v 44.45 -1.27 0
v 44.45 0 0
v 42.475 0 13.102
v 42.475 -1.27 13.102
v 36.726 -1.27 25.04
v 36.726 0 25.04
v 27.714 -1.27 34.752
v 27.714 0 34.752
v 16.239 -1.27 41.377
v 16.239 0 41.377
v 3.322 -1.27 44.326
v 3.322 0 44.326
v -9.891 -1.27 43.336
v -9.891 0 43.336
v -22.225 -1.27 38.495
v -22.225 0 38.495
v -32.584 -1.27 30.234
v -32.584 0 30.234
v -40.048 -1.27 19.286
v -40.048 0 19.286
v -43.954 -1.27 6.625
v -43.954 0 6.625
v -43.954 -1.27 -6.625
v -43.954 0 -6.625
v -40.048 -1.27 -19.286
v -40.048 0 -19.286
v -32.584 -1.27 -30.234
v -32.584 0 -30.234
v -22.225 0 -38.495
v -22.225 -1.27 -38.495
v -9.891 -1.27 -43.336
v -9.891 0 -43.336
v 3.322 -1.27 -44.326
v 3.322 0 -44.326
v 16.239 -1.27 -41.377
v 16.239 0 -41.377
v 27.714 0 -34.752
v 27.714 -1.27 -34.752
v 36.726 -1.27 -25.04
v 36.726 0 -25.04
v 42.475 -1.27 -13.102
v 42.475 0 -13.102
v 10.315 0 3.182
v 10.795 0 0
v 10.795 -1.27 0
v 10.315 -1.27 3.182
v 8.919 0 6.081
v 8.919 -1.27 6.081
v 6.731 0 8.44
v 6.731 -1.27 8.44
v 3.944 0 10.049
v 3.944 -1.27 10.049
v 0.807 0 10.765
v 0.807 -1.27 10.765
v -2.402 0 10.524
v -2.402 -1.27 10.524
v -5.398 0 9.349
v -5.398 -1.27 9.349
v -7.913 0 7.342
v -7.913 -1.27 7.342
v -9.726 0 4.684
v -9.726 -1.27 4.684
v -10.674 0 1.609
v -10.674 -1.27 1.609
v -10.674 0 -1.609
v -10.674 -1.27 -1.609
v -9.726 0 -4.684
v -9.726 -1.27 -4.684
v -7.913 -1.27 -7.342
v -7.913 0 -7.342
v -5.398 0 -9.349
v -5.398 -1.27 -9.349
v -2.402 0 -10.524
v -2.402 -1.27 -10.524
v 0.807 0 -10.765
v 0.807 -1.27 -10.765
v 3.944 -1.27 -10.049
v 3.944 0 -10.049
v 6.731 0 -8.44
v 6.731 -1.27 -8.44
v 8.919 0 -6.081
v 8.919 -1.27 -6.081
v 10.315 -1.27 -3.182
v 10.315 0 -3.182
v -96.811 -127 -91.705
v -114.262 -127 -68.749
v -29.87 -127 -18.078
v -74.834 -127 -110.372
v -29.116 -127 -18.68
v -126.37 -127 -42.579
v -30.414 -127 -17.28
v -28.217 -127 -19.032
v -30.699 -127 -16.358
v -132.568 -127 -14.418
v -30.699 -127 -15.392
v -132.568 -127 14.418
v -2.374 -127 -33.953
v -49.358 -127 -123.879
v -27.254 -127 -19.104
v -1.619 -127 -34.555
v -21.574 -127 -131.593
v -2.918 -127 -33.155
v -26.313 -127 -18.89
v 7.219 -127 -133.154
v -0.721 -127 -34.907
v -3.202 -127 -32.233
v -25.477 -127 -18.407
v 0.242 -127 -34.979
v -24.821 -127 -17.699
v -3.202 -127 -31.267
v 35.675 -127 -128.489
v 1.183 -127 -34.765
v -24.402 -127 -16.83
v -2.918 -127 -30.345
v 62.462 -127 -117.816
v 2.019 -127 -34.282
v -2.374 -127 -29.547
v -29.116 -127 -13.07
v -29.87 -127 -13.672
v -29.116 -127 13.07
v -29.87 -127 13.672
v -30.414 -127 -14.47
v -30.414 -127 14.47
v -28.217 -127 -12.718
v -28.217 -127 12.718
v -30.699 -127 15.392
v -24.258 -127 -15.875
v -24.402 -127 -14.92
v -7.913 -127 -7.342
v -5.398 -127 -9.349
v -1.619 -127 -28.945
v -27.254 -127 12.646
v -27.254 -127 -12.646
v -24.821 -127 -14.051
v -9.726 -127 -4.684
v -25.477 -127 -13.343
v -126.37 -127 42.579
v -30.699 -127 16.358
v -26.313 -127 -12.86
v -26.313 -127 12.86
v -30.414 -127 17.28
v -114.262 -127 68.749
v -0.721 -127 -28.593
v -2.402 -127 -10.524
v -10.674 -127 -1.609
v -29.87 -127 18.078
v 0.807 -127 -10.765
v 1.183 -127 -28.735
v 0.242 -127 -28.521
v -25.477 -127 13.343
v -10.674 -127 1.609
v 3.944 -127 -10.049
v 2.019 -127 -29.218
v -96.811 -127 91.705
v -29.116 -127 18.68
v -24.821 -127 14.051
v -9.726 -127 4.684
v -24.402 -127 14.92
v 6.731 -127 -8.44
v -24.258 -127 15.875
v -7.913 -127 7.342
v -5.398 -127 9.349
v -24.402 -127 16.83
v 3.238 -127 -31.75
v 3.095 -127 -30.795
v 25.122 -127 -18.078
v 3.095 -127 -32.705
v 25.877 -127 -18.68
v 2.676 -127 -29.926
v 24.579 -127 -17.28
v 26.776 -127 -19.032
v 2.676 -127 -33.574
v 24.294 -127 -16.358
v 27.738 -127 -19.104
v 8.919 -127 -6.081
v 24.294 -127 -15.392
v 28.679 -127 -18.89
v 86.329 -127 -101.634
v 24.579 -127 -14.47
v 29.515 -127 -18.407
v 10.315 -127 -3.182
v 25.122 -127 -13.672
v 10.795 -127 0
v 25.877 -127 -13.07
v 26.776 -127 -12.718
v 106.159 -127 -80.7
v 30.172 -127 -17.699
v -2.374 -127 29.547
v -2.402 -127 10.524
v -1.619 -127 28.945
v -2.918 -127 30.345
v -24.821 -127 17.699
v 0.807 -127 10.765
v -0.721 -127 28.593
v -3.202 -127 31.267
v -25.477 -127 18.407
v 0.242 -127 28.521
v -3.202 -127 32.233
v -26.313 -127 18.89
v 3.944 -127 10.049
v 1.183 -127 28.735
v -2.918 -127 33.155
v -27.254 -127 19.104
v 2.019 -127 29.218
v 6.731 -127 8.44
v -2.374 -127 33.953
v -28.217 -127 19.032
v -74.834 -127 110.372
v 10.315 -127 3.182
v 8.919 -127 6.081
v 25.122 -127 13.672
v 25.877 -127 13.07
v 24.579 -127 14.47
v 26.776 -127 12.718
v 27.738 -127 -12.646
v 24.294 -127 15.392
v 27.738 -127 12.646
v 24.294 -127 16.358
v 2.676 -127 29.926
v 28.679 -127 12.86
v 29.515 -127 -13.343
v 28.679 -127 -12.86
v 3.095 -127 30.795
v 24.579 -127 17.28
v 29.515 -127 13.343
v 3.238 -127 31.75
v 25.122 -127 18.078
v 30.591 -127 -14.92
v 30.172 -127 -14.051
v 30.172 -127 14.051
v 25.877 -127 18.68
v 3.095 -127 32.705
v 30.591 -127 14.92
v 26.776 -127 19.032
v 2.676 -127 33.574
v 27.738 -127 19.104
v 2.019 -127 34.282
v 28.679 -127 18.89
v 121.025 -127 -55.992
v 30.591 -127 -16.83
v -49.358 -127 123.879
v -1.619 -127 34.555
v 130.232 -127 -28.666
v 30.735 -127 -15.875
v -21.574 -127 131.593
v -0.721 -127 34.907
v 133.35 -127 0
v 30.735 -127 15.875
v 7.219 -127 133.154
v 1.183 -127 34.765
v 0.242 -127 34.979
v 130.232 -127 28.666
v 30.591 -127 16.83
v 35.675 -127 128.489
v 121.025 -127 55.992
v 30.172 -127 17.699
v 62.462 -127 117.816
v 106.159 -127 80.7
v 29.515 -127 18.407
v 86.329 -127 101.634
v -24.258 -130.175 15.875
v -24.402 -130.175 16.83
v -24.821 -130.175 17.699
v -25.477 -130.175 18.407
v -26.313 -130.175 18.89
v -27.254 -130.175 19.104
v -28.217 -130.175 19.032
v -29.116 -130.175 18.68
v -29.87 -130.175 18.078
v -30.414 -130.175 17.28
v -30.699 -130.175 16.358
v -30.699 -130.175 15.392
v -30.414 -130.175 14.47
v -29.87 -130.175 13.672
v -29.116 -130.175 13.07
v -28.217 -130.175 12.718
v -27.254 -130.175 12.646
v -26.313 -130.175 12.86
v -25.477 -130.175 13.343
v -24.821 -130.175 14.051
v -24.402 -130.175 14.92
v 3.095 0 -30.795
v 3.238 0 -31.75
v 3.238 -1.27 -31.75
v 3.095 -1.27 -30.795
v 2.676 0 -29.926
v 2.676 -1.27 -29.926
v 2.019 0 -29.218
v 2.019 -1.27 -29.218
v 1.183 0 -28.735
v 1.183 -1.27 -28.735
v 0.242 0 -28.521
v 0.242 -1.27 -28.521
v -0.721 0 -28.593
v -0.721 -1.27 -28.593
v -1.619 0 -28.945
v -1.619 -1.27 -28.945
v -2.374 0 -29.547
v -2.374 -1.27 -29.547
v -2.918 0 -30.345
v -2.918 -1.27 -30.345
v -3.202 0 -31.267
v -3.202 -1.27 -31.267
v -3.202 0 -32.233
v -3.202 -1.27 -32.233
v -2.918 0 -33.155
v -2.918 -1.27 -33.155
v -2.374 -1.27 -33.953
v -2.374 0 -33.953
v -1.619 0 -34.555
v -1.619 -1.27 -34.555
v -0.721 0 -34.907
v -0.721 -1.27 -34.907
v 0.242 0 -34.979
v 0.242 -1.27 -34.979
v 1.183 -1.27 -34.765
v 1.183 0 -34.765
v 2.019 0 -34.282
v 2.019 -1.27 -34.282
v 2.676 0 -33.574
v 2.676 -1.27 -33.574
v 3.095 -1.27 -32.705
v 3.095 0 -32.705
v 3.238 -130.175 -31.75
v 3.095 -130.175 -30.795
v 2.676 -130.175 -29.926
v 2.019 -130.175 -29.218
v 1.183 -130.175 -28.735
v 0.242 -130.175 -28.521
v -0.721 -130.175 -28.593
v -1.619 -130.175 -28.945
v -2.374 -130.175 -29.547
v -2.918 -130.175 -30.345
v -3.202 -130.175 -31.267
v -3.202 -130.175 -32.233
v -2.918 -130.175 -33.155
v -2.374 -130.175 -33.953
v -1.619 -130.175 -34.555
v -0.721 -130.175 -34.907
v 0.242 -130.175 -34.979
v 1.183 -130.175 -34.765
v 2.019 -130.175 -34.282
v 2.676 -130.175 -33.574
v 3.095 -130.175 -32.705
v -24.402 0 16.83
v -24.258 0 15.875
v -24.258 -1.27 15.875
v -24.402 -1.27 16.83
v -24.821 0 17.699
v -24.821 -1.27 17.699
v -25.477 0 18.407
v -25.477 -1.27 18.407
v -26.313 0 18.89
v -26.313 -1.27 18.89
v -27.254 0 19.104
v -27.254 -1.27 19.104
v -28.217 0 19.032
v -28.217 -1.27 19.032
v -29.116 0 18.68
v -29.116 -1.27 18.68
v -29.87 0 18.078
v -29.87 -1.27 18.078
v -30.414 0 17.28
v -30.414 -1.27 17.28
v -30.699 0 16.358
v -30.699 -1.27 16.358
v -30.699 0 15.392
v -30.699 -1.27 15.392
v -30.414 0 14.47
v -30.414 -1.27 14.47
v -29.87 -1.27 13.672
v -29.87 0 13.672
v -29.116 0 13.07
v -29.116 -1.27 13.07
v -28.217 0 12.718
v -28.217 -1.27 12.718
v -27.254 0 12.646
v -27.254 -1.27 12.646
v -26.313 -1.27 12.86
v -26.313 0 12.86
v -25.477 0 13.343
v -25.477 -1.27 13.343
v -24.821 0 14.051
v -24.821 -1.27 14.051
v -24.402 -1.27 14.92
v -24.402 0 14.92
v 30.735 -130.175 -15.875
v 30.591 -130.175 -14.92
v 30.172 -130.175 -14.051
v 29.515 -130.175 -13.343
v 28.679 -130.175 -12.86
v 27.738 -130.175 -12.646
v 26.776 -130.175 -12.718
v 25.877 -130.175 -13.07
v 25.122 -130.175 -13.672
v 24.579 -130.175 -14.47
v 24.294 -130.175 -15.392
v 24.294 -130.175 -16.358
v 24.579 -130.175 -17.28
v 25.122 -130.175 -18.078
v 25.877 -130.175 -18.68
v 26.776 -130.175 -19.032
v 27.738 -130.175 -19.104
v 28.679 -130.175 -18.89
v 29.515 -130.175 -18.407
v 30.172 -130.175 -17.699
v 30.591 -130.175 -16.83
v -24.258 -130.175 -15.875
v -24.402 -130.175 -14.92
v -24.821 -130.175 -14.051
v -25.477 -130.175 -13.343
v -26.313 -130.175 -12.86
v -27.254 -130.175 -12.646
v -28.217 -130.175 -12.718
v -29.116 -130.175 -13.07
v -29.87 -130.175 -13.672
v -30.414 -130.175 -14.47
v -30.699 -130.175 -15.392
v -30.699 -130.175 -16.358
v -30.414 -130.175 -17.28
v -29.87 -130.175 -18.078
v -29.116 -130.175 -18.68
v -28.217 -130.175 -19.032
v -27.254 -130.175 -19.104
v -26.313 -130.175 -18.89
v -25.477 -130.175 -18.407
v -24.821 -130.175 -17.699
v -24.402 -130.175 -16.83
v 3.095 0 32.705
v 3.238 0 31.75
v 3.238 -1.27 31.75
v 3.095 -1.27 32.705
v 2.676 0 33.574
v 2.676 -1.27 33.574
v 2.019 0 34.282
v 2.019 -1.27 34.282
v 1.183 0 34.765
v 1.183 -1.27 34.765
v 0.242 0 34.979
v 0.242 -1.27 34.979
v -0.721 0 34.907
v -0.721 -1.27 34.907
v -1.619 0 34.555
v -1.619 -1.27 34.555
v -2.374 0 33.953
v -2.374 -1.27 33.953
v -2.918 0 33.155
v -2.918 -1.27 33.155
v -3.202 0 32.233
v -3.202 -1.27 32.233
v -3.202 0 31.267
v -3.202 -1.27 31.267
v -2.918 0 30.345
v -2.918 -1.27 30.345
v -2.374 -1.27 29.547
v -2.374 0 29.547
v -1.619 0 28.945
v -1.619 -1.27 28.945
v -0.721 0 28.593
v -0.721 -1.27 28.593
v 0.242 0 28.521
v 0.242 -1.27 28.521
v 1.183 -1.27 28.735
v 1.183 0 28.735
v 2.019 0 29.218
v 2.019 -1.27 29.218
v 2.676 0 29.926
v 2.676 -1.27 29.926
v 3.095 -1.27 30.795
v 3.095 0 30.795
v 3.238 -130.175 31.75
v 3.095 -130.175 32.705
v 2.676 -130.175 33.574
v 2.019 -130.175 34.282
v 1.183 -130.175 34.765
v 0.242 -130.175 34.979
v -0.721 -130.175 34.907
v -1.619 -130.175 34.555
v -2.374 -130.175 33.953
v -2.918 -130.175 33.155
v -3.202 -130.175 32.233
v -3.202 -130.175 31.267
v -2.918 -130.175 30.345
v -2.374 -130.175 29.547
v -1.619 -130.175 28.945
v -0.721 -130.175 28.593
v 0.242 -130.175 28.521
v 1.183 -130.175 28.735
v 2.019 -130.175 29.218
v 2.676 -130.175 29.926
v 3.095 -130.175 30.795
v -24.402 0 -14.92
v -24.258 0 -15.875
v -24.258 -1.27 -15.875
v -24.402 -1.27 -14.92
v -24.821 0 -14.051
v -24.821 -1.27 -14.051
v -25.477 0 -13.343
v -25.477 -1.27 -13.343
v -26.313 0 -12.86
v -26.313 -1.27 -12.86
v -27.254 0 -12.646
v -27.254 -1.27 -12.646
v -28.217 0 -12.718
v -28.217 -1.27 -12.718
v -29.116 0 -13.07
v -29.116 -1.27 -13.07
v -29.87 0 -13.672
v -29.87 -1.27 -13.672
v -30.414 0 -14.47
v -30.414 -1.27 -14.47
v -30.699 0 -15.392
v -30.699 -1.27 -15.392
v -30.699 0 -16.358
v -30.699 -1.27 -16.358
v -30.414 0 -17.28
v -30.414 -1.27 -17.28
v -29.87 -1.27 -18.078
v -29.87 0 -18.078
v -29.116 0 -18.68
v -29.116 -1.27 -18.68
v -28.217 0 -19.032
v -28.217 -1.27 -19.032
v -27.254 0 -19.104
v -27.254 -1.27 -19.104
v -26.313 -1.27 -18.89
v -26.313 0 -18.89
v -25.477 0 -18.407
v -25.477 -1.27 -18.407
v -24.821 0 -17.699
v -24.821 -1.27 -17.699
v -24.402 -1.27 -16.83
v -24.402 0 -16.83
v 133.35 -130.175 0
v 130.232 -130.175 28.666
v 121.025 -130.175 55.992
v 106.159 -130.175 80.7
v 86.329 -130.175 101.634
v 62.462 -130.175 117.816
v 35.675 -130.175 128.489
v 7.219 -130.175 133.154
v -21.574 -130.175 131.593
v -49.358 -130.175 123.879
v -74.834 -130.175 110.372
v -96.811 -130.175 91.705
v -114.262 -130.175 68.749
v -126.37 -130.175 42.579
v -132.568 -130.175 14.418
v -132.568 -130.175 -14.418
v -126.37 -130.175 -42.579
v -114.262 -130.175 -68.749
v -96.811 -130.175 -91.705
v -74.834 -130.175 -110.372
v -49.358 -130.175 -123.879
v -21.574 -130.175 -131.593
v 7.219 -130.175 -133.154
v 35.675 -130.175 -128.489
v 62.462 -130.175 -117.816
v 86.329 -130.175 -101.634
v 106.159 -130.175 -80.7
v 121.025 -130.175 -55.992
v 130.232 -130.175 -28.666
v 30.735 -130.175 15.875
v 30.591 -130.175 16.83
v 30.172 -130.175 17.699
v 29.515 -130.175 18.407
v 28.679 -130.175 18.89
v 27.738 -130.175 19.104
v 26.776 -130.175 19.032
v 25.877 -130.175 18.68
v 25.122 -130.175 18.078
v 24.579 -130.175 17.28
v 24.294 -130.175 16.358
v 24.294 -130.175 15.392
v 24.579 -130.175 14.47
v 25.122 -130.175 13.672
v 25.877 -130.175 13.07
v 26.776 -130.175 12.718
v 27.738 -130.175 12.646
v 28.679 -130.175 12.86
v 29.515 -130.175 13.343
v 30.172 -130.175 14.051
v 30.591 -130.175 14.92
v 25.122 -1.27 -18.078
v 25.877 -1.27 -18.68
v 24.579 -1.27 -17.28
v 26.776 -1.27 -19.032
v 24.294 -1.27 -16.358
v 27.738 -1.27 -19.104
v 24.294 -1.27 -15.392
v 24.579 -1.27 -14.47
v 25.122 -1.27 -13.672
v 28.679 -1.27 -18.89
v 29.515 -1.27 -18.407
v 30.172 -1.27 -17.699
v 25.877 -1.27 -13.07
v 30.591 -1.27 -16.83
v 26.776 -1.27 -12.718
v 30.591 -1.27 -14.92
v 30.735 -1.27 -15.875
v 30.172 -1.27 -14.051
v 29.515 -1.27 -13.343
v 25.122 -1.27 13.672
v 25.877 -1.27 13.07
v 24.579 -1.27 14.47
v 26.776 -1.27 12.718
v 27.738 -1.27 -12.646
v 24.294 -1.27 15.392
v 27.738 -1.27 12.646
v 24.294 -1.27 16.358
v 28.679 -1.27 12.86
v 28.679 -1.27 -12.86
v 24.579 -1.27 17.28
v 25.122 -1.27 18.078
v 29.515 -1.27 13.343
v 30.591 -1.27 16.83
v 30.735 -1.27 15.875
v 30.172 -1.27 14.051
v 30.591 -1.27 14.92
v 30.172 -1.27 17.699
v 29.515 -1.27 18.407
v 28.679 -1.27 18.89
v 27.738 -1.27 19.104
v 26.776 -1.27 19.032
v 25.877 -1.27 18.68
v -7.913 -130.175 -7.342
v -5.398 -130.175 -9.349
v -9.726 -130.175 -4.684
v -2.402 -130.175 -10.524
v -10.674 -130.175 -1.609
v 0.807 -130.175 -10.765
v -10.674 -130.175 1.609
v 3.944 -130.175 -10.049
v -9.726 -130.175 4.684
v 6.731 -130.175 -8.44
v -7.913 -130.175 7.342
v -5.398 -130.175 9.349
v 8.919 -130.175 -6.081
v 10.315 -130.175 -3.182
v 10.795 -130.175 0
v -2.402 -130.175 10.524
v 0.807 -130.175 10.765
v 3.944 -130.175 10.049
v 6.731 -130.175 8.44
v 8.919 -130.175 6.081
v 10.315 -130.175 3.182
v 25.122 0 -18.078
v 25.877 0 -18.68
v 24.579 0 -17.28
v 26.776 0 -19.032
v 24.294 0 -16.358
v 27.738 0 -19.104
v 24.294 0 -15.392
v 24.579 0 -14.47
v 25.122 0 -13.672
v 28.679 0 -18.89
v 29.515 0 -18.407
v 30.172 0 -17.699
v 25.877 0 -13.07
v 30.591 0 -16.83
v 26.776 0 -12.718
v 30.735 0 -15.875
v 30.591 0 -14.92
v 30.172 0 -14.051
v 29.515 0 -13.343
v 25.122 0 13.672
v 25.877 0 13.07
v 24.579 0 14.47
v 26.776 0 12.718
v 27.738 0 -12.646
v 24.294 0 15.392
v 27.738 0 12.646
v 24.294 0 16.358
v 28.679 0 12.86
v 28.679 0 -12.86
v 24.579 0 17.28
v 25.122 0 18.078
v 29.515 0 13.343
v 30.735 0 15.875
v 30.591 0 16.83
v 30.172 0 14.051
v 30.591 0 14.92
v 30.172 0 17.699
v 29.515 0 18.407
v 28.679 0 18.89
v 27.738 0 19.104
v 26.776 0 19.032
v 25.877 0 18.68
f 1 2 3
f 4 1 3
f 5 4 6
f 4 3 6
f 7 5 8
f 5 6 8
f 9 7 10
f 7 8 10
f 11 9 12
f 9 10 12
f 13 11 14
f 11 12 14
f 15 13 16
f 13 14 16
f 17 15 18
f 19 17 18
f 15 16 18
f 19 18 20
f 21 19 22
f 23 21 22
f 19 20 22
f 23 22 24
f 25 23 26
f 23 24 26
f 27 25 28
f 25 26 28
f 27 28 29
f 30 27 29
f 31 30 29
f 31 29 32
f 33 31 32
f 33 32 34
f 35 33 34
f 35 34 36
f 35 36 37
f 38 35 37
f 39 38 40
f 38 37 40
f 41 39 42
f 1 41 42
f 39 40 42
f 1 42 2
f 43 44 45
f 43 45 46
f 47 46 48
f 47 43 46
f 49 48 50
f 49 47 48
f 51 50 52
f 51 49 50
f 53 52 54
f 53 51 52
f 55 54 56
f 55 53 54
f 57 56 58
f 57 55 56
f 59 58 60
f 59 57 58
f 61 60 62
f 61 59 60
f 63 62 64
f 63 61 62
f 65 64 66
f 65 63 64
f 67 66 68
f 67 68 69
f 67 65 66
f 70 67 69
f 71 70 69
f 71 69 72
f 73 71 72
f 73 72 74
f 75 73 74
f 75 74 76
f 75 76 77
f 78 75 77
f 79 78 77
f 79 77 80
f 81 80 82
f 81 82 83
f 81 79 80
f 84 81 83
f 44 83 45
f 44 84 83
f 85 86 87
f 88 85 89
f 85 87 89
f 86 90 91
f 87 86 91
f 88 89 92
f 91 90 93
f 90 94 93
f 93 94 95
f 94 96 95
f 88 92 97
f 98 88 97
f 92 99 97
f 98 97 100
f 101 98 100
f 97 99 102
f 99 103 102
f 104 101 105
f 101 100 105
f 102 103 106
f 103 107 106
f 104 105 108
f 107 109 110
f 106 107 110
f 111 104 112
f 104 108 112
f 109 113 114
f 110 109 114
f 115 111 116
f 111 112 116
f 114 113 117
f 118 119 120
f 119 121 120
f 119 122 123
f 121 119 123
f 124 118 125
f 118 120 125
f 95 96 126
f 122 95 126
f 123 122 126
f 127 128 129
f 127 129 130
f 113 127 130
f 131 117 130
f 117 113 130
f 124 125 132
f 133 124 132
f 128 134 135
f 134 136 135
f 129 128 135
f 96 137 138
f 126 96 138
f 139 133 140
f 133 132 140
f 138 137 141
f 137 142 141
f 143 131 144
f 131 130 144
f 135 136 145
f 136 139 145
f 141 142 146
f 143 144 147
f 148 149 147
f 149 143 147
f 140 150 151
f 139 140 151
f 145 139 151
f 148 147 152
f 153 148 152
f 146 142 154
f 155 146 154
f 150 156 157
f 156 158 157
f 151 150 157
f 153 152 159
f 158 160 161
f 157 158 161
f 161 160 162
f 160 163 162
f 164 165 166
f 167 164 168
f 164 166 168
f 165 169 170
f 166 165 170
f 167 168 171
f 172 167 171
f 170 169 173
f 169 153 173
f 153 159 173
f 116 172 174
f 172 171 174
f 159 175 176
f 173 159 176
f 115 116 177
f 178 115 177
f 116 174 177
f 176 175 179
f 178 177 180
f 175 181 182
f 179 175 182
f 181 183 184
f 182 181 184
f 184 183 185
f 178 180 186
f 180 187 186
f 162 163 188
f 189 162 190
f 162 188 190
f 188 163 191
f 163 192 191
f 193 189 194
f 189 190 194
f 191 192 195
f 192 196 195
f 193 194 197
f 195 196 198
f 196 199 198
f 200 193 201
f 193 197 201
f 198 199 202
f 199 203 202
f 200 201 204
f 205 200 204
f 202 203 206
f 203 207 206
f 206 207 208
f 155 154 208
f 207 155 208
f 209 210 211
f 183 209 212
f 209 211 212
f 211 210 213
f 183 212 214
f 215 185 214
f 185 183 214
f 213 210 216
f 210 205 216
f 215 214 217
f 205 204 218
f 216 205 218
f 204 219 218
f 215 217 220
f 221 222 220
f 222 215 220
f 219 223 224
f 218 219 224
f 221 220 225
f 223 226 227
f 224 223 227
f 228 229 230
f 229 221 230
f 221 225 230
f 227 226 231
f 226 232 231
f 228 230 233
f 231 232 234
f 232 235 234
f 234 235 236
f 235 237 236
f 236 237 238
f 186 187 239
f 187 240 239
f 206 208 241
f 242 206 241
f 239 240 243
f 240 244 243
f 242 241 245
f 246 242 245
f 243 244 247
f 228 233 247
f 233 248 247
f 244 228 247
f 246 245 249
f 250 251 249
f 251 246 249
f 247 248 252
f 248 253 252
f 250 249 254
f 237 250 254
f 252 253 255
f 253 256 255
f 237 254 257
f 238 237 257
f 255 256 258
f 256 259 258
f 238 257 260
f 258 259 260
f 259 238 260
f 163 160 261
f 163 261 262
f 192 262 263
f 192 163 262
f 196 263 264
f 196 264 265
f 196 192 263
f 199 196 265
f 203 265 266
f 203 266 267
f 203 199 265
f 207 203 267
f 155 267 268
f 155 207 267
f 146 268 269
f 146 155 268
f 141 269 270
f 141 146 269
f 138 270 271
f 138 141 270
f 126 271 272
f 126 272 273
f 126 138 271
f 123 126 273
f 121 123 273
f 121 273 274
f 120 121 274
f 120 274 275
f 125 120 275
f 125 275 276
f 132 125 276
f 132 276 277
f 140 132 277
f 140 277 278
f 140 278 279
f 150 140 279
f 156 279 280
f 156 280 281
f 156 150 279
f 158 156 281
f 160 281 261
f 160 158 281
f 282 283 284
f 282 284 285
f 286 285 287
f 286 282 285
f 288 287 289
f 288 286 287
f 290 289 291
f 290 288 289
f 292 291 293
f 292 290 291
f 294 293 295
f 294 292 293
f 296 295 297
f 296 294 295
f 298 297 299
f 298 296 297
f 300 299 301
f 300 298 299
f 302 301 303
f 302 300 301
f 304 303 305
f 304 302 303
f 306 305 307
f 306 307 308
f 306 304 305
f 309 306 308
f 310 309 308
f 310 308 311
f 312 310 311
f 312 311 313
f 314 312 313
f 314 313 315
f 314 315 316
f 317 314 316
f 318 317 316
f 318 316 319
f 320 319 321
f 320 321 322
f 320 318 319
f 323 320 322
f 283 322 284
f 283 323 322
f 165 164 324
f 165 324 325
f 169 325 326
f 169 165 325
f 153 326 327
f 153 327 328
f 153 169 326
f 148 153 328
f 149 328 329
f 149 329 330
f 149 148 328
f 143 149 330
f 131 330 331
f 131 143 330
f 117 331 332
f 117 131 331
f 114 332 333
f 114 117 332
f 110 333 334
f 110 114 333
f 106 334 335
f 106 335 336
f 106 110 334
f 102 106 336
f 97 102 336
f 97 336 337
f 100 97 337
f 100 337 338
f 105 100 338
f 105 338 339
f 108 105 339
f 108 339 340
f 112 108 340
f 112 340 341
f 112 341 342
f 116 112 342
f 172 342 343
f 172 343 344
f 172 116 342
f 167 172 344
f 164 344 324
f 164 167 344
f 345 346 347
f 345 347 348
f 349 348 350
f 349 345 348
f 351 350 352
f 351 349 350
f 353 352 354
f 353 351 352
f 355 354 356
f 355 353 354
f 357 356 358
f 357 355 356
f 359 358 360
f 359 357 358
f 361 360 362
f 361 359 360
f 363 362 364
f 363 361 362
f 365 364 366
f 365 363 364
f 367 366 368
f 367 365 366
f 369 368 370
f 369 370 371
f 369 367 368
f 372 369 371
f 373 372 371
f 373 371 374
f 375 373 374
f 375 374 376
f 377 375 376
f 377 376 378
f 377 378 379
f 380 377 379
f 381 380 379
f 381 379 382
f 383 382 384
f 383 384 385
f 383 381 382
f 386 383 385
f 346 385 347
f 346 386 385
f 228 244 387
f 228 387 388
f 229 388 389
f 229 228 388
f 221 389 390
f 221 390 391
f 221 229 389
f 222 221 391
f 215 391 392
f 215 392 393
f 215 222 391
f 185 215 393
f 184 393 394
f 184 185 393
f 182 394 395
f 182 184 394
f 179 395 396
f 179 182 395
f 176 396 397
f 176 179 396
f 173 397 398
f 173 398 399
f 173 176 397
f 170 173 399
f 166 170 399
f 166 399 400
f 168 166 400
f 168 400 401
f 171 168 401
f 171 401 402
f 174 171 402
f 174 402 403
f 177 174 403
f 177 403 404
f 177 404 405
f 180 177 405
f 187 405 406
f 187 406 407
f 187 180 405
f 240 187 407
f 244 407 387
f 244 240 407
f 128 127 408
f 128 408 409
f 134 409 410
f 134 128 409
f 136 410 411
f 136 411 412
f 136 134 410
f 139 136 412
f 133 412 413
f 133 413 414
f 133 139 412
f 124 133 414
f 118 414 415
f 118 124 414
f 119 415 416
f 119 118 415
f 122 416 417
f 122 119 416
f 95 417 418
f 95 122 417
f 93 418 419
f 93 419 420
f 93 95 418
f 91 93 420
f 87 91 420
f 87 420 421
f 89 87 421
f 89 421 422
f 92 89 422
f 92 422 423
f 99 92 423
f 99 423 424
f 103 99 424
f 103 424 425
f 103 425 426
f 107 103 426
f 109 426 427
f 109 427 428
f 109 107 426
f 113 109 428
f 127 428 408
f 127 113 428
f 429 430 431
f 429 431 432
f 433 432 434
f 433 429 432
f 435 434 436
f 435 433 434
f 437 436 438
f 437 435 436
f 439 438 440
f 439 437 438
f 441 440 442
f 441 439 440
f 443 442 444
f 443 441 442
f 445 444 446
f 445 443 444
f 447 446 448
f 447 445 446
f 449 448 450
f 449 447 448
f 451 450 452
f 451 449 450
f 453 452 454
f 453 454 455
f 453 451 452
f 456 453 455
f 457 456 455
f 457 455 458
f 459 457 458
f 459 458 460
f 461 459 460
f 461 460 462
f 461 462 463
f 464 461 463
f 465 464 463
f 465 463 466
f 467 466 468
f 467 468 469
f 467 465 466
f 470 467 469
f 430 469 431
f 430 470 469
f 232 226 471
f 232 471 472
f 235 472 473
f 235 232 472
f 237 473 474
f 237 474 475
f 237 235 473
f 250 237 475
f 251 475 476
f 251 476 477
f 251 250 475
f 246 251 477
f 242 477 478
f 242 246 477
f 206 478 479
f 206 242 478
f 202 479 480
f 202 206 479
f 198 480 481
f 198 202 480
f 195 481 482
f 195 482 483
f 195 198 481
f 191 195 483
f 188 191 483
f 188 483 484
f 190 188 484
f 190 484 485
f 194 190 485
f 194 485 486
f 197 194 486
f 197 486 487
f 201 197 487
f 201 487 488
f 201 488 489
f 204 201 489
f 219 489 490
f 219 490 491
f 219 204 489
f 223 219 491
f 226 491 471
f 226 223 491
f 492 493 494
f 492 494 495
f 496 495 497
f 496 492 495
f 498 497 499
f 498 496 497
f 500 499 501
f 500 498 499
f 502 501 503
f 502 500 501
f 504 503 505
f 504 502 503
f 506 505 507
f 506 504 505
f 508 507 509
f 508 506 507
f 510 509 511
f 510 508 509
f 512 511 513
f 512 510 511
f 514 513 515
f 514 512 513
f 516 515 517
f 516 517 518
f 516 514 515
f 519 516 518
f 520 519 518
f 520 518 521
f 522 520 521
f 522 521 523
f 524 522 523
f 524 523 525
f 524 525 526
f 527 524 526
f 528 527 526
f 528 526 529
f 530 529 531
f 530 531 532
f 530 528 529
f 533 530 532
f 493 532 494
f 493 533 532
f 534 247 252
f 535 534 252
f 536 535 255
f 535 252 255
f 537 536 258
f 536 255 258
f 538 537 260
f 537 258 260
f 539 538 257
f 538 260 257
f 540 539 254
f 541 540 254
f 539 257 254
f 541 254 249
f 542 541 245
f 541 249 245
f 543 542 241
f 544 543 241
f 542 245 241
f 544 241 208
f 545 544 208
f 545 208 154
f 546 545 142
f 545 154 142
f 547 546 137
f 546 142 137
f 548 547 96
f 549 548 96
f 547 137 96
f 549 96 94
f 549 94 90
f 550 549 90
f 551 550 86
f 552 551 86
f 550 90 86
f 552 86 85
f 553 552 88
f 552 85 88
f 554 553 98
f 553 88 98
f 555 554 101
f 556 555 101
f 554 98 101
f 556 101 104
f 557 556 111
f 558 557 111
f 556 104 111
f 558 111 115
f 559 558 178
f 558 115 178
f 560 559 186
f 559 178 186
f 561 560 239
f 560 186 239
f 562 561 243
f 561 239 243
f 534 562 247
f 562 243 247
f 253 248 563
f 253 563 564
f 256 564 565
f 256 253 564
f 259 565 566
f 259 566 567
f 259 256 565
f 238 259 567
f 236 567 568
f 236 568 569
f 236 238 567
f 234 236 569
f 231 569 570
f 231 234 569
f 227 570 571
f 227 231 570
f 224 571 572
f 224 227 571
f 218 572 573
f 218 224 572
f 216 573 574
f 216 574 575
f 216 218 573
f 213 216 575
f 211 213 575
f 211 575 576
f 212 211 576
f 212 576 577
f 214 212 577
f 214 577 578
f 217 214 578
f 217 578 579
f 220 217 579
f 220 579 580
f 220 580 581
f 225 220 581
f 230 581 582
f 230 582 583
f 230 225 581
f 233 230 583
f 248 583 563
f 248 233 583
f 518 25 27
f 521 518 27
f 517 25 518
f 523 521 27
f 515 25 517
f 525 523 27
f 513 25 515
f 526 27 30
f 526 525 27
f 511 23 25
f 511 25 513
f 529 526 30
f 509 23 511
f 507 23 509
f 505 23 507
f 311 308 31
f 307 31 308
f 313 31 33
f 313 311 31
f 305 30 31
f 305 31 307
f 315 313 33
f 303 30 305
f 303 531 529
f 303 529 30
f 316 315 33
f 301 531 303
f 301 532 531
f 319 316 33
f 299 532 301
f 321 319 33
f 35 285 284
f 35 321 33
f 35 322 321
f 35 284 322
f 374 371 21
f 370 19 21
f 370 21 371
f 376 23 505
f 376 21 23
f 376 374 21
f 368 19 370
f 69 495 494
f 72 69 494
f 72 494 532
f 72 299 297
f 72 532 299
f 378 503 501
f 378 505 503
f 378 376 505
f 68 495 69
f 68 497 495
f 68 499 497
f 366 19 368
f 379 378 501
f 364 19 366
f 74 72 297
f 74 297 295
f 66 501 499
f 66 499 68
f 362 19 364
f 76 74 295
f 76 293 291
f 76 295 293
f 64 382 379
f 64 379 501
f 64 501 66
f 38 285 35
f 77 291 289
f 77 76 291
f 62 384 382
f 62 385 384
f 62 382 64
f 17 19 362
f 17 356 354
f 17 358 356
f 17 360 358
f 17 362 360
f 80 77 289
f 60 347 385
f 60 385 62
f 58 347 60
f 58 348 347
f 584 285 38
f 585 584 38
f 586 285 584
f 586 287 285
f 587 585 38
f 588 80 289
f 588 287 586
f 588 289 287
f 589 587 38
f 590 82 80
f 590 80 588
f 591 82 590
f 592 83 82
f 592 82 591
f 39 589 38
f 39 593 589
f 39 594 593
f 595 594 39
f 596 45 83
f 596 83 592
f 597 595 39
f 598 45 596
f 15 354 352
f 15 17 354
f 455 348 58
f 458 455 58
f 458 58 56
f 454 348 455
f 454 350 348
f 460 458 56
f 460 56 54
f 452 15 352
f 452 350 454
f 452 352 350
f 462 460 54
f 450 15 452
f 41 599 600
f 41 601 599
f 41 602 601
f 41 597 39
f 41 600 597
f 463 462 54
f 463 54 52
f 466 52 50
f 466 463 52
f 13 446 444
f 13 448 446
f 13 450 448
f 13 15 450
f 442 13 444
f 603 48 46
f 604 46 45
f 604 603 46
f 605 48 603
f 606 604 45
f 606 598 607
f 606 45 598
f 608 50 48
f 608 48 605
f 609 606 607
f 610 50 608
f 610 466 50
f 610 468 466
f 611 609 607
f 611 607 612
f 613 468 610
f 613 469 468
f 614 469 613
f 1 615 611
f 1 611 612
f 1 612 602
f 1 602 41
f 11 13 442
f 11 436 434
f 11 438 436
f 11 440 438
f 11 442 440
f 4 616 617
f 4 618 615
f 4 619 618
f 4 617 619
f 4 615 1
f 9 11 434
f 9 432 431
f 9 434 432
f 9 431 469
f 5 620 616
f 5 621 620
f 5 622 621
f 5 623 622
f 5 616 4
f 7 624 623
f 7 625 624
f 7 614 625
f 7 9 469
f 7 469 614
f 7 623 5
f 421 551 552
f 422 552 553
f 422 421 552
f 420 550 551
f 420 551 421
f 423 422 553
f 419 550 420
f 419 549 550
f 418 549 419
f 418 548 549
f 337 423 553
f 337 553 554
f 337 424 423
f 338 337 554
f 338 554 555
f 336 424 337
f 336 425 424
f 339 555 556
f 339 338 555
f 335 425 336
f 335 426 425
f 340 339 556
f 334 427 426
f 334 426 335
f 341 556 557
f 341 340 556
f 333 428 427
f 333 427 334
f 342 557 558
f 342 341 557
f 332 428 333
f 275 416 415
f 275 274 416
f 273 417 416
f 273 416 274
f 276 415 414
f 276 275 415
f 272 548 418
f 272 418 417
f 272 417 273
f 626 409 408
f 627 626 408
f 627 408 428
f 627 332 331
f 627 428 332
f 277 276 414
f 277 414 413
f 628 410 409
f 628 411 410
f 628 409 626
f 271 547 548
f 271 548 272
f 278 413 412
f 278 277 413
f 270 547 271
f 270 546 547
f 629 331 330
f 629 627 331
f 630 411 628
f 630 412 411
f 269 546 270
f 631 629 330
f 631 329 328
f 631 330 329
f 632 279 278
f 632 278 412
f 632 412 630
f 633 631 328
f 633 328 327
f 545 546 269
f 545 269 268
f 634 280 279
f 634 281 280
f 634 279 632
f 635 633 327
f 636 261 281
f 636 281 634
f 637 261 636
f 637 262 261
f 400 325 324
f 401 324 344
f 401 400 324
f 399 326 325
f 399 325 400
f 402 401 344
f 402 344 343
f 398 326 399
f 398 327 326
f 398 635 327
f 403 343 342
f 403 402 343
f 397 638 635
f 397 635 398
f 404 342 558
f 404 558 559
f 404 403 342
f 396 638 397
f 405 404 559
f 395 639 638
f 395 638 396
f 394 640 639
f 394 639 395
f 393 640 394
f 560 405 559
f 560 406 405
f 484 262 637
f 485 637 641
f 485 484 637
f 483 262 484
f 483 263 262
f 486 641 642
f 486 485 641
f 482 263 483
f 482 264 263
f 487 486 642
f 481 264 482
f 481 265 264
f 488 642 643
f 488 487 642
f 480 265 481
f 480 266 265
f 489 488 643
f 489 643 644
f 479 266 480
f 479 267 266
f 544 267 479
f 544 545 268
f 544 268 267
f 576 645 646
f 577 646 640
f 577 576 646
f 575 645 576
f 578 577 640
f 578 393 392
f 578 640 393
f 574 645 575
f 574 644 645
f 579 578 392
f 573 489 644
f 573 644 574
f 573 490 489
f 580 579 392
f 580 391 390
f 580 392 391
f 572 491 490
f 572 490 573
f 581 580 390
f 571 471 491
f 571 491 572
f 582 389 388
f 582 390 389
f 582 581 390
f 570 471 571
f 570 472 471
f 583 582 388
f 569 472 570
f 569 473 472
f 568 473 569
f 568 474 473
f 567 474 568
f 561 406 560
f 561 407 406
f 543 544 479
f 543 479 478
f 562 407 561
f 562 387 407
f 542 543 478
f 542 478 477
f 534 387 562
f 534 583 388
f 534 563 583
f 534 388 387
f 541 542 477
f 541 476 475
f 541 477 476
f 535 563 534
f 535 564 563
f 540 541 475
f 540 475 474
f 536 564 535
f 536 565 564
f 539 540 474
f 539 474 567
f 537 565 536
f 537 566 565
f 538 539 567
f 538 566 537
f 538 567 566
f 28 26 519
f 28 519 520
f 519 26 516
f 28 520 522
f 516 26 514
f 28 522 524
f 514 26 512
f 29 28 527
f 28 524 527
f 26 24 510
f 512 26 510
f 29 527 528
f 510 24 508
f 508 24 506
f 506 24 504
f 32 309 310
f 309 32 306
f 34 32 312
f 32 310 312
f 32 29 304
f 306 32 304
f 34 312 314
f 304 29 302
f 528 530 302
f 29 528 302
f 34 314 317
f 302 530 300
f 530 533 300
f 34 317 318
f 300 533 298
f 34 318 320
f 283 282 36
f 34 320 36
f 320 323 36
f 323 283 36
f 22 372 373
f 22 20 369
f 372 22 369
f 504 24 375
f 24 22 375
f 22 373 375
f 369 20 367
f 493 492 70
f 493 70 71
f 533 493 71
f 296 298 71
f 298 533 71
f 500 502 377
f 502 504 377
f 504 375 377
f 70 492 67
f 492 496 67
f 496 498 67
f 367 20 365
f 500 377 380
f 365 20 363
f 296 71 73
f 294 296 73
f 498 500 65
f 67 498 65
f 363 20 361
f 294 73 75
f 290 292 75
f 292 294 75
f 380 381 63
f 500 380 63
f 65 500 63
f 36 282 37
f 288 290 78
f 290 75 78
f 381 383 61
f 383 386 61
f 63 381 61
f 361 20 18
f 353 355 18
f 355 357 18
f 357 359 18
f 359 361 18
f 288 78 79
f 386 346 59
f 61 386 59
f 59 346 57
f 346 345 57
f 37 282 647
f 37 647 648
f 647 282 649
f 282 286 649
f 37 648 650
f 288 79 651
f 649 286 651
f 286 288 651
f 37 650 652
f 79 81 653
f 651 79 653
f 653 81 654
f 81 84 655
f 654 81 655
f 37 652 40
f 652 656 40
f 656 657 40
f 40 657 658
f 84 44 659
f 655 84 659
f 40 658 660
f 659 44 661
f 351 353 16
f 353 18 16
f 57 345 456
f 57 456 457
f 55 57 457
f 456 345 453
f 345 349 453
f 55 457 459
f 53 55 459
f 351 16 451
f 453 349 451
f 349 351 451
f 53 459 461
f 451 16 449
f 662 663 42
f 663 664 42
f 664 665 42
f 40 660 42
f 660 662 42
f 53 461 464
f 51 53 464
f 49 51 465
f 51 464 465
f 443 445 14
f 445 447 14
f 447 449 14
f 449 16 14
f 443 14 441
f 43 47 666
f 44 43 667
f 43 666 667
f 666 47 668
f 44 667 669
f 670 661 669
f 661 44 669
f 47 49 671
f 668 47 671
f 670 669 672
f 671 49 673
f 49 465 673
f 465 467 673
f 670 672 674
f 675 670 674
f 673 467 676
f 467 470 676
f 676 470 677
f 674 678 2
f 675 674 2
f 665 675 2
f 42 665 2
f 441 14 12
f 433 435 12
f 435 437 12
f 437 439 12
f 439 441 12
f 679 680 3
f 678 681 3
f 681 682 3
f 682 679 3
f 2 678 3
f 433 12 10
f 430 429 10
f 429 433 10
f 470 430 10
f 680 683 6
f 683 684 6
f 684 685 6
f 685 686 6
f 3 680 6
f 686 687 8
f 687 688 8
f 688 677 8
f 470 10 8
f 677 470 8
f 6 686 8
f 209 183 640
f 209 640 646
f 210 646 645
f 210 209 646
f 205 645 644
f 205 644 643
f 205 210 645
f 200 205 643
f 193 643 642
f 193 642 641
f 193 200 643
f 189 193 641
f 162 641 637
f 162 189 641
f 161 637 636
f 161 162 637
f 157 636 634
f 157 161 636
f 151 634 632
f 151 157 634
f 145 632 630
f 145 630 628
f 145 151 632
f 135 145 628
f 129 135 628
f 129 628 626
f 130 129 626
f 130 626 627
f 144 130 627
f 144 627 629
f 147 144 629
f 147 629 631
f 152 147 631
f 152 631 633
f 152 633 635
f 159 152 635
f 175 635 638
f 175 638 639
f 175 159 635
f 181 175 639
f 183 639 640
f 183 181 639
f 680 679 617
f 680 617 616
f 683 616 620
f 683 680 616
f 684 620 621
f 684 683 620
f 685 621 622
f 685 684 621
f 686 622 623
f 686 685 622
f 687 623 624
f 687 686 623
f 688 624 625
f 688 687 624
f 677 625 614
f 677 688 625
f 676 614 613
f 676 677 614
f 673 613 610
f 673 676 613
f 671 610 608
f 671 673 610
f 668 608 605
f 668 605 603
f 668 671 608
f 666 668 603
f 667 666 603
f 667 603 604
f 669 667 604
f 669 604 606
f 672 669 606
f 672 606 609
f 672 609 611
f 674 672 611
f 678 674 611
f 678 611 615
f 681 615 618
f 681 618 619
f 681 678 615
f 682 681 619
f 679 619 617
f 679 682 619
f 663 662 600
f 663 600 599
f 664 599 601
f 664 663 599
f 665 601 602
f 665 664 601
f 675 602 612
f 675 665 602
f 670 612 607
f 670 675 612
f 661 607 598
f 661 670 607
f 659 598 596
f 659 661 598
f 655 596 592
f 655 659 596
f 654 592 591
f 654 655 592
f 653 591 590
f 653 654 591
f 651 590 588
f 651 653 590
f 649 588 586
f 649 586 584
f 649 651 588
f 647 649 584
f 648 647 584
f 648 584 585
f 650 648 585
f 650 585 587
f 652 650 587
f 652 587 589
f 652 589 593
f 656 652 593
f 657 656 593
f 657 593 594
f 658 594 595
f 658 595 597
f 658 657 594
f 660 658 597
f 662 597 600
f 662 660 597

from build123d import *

# Parameters (mm, degrees)
F0_R     = 44.45
F0_R_2   = 3.2385
F0_R_3   = 10.795
F1_DEPTH = 1.27
F3_R     = 133.35
F3_R_2   = 3.2385
F3_R_3   = 10.795
F4_DEPTH = 3.175


with BuildPart() as f1:
    # F0 (on Front) → F1 (new body)
    with BuildSketch(Plane.XZ):
        Circle(F0_R)
        with Locations((-27.496307, -15.875)):
            Circle(F0_R_2, mode=Mode.SUBTRACT)
        with Locations((0, -31.75)):
            Circle(F0_R_2, mode=Mode.SUBTRACT)
        with Locations((27.496307, -15.875)):
            Circle(F0_R_2, mode=Mode.SUBTRACT)
        with Locations((-27.496307, 15.875)):
            Circle(F0_R_2, mode=Mode.SUBTRACT)
        Circle(F0_R_3, mode=Mode.SUBTRACT)
        with Locations((27.496307, 15.875)):
            Circle(F0_R_2, mode=Mode.SUBTRACT)
        with Locations((0, 31.75)):
            Circle(F0_R_2, mode=Mode.SUBTRACT)
    extrude(amount=F1_DEPTH)


with BuildPart() as f4:
    # F3 (on offset) → F4 (new body)
    with BuildSketch(Plane.XZ.offset(127)):
        Circle(F3_R)
        with Locations((-27.496307, -15.875)):
            Circle(F3_R_2, mode=Mode.SUBTRACT)
        with Locations((0, -31.75)):
            Circle(F3_R_2, mode=Mode.SUBTRACT)
        with Locations((27.496307, -15.875)):
            Circle(F3_R_2, mode=Mode.SUBTRACT)
        with Locations((-27.496307, 15.875)):
            Circle(F3_R_2, mode=Mode.SUBTRACT)
        Circle(F3_R_3, mode=Mode.SUBTRACT)
        with Locations((27.496307, 15.875)):
            Circle(F3_R_2, mode=Mode.SUBTRACT)
        with Locations((0, 31.75)):
            Circle(F3_R_2, mode=Mode.SUBTRACT)
    extrude(amount=F4_DEPTH)


solid = Compound([f1.part, f4.part])
